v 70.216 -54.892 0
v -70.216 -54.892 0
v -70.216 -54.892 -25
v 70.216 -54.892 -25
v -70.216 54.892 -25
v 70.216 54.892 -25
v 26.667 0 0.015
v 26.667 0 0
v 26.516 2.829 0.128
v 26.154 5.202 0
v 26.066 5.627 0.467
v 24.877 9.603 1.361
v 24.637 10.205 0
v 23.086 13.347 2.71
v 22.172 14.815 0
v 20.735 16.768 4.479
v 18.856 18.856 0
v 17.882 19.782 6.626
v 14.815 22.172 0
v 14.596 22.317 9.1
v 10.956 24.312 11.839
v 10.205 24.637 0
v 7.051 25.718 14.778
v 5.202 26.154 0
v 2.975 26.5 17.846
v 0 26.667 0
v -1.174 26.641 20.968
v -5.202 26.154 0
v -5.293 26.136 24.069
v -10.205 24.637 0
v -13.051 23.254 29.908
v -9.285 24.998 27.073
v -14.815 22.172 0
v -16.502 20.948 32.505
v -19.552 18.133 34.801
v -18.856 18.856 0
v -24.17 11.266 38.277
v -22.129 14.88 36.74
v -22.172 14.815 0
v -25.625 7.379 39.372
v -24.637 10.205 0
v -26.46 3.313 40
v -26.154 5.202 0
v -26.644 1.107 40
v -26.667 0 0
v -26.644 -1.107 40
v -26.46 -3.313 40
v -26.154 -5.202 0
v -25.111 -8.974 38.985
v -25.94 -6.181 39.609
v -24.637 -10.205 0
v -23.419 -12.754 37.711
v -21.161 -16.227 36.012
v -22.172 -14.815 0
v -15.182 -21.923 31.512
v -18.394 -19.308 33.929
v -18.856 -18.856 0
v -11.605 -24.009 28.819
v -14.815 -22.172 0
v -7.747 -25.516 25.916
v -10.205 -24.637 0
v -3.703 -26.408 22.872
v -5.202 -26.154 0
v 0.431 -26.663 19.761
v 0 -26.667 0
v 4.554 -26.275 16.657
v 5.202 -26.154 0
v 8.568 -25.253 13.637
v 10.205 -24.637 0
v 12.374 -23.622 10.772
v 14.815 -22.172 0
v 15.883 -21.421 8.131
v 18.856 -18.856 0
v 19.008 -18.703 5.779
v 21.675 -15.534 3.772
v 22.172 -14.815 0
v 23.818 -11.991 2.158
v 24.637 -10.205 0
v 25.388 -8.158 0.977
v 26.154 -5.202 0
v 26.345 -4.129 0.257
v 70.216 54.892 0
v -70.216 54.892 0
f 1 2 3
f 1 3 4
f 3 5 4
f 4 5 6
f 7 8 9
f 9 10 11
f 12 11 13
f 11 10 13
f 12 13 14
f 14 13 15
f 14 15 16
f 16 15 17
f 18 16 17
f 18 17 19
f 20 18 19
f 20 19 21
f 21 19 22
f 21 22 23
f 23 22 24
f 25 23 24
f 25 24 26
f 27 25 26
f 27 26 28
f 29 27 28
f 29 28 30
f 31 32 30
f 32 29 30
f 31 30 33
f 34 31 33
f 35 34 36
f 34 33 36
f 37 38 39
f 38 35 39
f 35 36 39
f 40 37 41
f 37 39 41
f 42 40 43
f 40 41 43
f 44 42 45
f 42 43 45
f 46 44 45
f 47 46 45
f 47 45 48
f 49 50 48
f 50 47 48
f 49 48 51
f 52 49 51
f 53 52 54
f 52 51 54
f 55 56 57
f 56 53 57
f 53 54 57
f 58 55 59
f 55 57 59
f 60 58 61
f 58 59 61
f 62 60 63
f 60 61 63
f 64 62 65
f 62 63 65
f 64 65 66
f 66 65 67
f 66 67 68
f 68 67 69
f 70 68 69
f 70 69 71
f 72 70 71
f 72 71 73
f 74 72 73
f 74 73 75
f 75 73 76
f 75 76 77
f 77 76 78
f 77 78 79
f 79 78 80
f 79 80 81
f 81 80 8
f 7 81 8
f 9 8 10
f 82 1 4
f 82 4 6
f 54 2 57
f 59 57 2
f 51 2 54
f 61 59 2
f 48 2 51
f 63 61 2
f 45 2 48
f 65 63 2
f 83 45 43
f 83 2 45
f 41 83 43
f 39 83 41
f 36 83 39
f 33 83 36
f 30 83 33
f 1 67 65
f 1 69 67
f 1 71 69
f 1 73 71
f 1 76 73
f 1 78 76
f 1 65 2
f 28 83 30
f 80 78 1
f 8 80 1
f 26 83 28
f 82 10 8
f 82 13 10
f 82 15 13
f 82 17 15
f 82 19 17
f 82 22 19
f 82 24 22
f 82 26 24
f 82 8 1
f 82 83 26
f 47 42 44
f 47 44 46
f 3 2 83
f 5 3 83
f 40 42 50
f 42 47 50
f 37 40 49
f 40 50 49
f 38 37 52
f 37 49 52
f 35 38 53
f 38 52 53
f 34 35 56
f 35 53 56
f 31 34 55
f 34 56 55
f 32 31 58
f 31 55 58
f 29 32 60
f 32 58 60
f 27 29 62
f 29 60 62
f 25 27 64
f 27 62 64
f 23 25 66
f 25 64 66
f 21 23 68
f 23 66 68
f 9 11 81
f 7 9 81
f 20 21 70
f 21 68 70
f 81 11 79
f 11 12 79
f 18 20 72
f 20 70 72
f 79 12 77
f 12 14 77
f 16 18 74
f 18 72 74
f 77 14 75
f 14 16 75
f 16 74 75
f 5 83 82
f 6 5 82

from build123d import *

# Parameters (mm, degrees)
F0_W     = 140.431046
F0_H     = 109.784484
F1_DEPTH = 25
F2_R     = 26.666566
F3_DEPTH = 40
F5_DEPTH = 128


with BuildPart() as f1:
    # F0 (on Top) → F1 (new body)
    with BuildSketch(Plane.XY):
        Rectangle(F0_W, F0_H)
    extrude(amount=-F1_DEPTH)

    # F2 (on face) → F3 (join)
    with BuildSketch(Plane.XY):
        Circle(F2_R)
    extrude(amount=F3_DEPTH)

    # F4 (on face) → F5 (cut)
    with BuildSketch(Plane.XZ.offset(54.892242)):
        Polygon((-26.627764, 40.126272), (26.686043, 0), (26.686043, 40.126272), align=None)
    extrude(amount=-F5_DEPTH, mode=Mode.SUBTRACT)


solid = f1.part
